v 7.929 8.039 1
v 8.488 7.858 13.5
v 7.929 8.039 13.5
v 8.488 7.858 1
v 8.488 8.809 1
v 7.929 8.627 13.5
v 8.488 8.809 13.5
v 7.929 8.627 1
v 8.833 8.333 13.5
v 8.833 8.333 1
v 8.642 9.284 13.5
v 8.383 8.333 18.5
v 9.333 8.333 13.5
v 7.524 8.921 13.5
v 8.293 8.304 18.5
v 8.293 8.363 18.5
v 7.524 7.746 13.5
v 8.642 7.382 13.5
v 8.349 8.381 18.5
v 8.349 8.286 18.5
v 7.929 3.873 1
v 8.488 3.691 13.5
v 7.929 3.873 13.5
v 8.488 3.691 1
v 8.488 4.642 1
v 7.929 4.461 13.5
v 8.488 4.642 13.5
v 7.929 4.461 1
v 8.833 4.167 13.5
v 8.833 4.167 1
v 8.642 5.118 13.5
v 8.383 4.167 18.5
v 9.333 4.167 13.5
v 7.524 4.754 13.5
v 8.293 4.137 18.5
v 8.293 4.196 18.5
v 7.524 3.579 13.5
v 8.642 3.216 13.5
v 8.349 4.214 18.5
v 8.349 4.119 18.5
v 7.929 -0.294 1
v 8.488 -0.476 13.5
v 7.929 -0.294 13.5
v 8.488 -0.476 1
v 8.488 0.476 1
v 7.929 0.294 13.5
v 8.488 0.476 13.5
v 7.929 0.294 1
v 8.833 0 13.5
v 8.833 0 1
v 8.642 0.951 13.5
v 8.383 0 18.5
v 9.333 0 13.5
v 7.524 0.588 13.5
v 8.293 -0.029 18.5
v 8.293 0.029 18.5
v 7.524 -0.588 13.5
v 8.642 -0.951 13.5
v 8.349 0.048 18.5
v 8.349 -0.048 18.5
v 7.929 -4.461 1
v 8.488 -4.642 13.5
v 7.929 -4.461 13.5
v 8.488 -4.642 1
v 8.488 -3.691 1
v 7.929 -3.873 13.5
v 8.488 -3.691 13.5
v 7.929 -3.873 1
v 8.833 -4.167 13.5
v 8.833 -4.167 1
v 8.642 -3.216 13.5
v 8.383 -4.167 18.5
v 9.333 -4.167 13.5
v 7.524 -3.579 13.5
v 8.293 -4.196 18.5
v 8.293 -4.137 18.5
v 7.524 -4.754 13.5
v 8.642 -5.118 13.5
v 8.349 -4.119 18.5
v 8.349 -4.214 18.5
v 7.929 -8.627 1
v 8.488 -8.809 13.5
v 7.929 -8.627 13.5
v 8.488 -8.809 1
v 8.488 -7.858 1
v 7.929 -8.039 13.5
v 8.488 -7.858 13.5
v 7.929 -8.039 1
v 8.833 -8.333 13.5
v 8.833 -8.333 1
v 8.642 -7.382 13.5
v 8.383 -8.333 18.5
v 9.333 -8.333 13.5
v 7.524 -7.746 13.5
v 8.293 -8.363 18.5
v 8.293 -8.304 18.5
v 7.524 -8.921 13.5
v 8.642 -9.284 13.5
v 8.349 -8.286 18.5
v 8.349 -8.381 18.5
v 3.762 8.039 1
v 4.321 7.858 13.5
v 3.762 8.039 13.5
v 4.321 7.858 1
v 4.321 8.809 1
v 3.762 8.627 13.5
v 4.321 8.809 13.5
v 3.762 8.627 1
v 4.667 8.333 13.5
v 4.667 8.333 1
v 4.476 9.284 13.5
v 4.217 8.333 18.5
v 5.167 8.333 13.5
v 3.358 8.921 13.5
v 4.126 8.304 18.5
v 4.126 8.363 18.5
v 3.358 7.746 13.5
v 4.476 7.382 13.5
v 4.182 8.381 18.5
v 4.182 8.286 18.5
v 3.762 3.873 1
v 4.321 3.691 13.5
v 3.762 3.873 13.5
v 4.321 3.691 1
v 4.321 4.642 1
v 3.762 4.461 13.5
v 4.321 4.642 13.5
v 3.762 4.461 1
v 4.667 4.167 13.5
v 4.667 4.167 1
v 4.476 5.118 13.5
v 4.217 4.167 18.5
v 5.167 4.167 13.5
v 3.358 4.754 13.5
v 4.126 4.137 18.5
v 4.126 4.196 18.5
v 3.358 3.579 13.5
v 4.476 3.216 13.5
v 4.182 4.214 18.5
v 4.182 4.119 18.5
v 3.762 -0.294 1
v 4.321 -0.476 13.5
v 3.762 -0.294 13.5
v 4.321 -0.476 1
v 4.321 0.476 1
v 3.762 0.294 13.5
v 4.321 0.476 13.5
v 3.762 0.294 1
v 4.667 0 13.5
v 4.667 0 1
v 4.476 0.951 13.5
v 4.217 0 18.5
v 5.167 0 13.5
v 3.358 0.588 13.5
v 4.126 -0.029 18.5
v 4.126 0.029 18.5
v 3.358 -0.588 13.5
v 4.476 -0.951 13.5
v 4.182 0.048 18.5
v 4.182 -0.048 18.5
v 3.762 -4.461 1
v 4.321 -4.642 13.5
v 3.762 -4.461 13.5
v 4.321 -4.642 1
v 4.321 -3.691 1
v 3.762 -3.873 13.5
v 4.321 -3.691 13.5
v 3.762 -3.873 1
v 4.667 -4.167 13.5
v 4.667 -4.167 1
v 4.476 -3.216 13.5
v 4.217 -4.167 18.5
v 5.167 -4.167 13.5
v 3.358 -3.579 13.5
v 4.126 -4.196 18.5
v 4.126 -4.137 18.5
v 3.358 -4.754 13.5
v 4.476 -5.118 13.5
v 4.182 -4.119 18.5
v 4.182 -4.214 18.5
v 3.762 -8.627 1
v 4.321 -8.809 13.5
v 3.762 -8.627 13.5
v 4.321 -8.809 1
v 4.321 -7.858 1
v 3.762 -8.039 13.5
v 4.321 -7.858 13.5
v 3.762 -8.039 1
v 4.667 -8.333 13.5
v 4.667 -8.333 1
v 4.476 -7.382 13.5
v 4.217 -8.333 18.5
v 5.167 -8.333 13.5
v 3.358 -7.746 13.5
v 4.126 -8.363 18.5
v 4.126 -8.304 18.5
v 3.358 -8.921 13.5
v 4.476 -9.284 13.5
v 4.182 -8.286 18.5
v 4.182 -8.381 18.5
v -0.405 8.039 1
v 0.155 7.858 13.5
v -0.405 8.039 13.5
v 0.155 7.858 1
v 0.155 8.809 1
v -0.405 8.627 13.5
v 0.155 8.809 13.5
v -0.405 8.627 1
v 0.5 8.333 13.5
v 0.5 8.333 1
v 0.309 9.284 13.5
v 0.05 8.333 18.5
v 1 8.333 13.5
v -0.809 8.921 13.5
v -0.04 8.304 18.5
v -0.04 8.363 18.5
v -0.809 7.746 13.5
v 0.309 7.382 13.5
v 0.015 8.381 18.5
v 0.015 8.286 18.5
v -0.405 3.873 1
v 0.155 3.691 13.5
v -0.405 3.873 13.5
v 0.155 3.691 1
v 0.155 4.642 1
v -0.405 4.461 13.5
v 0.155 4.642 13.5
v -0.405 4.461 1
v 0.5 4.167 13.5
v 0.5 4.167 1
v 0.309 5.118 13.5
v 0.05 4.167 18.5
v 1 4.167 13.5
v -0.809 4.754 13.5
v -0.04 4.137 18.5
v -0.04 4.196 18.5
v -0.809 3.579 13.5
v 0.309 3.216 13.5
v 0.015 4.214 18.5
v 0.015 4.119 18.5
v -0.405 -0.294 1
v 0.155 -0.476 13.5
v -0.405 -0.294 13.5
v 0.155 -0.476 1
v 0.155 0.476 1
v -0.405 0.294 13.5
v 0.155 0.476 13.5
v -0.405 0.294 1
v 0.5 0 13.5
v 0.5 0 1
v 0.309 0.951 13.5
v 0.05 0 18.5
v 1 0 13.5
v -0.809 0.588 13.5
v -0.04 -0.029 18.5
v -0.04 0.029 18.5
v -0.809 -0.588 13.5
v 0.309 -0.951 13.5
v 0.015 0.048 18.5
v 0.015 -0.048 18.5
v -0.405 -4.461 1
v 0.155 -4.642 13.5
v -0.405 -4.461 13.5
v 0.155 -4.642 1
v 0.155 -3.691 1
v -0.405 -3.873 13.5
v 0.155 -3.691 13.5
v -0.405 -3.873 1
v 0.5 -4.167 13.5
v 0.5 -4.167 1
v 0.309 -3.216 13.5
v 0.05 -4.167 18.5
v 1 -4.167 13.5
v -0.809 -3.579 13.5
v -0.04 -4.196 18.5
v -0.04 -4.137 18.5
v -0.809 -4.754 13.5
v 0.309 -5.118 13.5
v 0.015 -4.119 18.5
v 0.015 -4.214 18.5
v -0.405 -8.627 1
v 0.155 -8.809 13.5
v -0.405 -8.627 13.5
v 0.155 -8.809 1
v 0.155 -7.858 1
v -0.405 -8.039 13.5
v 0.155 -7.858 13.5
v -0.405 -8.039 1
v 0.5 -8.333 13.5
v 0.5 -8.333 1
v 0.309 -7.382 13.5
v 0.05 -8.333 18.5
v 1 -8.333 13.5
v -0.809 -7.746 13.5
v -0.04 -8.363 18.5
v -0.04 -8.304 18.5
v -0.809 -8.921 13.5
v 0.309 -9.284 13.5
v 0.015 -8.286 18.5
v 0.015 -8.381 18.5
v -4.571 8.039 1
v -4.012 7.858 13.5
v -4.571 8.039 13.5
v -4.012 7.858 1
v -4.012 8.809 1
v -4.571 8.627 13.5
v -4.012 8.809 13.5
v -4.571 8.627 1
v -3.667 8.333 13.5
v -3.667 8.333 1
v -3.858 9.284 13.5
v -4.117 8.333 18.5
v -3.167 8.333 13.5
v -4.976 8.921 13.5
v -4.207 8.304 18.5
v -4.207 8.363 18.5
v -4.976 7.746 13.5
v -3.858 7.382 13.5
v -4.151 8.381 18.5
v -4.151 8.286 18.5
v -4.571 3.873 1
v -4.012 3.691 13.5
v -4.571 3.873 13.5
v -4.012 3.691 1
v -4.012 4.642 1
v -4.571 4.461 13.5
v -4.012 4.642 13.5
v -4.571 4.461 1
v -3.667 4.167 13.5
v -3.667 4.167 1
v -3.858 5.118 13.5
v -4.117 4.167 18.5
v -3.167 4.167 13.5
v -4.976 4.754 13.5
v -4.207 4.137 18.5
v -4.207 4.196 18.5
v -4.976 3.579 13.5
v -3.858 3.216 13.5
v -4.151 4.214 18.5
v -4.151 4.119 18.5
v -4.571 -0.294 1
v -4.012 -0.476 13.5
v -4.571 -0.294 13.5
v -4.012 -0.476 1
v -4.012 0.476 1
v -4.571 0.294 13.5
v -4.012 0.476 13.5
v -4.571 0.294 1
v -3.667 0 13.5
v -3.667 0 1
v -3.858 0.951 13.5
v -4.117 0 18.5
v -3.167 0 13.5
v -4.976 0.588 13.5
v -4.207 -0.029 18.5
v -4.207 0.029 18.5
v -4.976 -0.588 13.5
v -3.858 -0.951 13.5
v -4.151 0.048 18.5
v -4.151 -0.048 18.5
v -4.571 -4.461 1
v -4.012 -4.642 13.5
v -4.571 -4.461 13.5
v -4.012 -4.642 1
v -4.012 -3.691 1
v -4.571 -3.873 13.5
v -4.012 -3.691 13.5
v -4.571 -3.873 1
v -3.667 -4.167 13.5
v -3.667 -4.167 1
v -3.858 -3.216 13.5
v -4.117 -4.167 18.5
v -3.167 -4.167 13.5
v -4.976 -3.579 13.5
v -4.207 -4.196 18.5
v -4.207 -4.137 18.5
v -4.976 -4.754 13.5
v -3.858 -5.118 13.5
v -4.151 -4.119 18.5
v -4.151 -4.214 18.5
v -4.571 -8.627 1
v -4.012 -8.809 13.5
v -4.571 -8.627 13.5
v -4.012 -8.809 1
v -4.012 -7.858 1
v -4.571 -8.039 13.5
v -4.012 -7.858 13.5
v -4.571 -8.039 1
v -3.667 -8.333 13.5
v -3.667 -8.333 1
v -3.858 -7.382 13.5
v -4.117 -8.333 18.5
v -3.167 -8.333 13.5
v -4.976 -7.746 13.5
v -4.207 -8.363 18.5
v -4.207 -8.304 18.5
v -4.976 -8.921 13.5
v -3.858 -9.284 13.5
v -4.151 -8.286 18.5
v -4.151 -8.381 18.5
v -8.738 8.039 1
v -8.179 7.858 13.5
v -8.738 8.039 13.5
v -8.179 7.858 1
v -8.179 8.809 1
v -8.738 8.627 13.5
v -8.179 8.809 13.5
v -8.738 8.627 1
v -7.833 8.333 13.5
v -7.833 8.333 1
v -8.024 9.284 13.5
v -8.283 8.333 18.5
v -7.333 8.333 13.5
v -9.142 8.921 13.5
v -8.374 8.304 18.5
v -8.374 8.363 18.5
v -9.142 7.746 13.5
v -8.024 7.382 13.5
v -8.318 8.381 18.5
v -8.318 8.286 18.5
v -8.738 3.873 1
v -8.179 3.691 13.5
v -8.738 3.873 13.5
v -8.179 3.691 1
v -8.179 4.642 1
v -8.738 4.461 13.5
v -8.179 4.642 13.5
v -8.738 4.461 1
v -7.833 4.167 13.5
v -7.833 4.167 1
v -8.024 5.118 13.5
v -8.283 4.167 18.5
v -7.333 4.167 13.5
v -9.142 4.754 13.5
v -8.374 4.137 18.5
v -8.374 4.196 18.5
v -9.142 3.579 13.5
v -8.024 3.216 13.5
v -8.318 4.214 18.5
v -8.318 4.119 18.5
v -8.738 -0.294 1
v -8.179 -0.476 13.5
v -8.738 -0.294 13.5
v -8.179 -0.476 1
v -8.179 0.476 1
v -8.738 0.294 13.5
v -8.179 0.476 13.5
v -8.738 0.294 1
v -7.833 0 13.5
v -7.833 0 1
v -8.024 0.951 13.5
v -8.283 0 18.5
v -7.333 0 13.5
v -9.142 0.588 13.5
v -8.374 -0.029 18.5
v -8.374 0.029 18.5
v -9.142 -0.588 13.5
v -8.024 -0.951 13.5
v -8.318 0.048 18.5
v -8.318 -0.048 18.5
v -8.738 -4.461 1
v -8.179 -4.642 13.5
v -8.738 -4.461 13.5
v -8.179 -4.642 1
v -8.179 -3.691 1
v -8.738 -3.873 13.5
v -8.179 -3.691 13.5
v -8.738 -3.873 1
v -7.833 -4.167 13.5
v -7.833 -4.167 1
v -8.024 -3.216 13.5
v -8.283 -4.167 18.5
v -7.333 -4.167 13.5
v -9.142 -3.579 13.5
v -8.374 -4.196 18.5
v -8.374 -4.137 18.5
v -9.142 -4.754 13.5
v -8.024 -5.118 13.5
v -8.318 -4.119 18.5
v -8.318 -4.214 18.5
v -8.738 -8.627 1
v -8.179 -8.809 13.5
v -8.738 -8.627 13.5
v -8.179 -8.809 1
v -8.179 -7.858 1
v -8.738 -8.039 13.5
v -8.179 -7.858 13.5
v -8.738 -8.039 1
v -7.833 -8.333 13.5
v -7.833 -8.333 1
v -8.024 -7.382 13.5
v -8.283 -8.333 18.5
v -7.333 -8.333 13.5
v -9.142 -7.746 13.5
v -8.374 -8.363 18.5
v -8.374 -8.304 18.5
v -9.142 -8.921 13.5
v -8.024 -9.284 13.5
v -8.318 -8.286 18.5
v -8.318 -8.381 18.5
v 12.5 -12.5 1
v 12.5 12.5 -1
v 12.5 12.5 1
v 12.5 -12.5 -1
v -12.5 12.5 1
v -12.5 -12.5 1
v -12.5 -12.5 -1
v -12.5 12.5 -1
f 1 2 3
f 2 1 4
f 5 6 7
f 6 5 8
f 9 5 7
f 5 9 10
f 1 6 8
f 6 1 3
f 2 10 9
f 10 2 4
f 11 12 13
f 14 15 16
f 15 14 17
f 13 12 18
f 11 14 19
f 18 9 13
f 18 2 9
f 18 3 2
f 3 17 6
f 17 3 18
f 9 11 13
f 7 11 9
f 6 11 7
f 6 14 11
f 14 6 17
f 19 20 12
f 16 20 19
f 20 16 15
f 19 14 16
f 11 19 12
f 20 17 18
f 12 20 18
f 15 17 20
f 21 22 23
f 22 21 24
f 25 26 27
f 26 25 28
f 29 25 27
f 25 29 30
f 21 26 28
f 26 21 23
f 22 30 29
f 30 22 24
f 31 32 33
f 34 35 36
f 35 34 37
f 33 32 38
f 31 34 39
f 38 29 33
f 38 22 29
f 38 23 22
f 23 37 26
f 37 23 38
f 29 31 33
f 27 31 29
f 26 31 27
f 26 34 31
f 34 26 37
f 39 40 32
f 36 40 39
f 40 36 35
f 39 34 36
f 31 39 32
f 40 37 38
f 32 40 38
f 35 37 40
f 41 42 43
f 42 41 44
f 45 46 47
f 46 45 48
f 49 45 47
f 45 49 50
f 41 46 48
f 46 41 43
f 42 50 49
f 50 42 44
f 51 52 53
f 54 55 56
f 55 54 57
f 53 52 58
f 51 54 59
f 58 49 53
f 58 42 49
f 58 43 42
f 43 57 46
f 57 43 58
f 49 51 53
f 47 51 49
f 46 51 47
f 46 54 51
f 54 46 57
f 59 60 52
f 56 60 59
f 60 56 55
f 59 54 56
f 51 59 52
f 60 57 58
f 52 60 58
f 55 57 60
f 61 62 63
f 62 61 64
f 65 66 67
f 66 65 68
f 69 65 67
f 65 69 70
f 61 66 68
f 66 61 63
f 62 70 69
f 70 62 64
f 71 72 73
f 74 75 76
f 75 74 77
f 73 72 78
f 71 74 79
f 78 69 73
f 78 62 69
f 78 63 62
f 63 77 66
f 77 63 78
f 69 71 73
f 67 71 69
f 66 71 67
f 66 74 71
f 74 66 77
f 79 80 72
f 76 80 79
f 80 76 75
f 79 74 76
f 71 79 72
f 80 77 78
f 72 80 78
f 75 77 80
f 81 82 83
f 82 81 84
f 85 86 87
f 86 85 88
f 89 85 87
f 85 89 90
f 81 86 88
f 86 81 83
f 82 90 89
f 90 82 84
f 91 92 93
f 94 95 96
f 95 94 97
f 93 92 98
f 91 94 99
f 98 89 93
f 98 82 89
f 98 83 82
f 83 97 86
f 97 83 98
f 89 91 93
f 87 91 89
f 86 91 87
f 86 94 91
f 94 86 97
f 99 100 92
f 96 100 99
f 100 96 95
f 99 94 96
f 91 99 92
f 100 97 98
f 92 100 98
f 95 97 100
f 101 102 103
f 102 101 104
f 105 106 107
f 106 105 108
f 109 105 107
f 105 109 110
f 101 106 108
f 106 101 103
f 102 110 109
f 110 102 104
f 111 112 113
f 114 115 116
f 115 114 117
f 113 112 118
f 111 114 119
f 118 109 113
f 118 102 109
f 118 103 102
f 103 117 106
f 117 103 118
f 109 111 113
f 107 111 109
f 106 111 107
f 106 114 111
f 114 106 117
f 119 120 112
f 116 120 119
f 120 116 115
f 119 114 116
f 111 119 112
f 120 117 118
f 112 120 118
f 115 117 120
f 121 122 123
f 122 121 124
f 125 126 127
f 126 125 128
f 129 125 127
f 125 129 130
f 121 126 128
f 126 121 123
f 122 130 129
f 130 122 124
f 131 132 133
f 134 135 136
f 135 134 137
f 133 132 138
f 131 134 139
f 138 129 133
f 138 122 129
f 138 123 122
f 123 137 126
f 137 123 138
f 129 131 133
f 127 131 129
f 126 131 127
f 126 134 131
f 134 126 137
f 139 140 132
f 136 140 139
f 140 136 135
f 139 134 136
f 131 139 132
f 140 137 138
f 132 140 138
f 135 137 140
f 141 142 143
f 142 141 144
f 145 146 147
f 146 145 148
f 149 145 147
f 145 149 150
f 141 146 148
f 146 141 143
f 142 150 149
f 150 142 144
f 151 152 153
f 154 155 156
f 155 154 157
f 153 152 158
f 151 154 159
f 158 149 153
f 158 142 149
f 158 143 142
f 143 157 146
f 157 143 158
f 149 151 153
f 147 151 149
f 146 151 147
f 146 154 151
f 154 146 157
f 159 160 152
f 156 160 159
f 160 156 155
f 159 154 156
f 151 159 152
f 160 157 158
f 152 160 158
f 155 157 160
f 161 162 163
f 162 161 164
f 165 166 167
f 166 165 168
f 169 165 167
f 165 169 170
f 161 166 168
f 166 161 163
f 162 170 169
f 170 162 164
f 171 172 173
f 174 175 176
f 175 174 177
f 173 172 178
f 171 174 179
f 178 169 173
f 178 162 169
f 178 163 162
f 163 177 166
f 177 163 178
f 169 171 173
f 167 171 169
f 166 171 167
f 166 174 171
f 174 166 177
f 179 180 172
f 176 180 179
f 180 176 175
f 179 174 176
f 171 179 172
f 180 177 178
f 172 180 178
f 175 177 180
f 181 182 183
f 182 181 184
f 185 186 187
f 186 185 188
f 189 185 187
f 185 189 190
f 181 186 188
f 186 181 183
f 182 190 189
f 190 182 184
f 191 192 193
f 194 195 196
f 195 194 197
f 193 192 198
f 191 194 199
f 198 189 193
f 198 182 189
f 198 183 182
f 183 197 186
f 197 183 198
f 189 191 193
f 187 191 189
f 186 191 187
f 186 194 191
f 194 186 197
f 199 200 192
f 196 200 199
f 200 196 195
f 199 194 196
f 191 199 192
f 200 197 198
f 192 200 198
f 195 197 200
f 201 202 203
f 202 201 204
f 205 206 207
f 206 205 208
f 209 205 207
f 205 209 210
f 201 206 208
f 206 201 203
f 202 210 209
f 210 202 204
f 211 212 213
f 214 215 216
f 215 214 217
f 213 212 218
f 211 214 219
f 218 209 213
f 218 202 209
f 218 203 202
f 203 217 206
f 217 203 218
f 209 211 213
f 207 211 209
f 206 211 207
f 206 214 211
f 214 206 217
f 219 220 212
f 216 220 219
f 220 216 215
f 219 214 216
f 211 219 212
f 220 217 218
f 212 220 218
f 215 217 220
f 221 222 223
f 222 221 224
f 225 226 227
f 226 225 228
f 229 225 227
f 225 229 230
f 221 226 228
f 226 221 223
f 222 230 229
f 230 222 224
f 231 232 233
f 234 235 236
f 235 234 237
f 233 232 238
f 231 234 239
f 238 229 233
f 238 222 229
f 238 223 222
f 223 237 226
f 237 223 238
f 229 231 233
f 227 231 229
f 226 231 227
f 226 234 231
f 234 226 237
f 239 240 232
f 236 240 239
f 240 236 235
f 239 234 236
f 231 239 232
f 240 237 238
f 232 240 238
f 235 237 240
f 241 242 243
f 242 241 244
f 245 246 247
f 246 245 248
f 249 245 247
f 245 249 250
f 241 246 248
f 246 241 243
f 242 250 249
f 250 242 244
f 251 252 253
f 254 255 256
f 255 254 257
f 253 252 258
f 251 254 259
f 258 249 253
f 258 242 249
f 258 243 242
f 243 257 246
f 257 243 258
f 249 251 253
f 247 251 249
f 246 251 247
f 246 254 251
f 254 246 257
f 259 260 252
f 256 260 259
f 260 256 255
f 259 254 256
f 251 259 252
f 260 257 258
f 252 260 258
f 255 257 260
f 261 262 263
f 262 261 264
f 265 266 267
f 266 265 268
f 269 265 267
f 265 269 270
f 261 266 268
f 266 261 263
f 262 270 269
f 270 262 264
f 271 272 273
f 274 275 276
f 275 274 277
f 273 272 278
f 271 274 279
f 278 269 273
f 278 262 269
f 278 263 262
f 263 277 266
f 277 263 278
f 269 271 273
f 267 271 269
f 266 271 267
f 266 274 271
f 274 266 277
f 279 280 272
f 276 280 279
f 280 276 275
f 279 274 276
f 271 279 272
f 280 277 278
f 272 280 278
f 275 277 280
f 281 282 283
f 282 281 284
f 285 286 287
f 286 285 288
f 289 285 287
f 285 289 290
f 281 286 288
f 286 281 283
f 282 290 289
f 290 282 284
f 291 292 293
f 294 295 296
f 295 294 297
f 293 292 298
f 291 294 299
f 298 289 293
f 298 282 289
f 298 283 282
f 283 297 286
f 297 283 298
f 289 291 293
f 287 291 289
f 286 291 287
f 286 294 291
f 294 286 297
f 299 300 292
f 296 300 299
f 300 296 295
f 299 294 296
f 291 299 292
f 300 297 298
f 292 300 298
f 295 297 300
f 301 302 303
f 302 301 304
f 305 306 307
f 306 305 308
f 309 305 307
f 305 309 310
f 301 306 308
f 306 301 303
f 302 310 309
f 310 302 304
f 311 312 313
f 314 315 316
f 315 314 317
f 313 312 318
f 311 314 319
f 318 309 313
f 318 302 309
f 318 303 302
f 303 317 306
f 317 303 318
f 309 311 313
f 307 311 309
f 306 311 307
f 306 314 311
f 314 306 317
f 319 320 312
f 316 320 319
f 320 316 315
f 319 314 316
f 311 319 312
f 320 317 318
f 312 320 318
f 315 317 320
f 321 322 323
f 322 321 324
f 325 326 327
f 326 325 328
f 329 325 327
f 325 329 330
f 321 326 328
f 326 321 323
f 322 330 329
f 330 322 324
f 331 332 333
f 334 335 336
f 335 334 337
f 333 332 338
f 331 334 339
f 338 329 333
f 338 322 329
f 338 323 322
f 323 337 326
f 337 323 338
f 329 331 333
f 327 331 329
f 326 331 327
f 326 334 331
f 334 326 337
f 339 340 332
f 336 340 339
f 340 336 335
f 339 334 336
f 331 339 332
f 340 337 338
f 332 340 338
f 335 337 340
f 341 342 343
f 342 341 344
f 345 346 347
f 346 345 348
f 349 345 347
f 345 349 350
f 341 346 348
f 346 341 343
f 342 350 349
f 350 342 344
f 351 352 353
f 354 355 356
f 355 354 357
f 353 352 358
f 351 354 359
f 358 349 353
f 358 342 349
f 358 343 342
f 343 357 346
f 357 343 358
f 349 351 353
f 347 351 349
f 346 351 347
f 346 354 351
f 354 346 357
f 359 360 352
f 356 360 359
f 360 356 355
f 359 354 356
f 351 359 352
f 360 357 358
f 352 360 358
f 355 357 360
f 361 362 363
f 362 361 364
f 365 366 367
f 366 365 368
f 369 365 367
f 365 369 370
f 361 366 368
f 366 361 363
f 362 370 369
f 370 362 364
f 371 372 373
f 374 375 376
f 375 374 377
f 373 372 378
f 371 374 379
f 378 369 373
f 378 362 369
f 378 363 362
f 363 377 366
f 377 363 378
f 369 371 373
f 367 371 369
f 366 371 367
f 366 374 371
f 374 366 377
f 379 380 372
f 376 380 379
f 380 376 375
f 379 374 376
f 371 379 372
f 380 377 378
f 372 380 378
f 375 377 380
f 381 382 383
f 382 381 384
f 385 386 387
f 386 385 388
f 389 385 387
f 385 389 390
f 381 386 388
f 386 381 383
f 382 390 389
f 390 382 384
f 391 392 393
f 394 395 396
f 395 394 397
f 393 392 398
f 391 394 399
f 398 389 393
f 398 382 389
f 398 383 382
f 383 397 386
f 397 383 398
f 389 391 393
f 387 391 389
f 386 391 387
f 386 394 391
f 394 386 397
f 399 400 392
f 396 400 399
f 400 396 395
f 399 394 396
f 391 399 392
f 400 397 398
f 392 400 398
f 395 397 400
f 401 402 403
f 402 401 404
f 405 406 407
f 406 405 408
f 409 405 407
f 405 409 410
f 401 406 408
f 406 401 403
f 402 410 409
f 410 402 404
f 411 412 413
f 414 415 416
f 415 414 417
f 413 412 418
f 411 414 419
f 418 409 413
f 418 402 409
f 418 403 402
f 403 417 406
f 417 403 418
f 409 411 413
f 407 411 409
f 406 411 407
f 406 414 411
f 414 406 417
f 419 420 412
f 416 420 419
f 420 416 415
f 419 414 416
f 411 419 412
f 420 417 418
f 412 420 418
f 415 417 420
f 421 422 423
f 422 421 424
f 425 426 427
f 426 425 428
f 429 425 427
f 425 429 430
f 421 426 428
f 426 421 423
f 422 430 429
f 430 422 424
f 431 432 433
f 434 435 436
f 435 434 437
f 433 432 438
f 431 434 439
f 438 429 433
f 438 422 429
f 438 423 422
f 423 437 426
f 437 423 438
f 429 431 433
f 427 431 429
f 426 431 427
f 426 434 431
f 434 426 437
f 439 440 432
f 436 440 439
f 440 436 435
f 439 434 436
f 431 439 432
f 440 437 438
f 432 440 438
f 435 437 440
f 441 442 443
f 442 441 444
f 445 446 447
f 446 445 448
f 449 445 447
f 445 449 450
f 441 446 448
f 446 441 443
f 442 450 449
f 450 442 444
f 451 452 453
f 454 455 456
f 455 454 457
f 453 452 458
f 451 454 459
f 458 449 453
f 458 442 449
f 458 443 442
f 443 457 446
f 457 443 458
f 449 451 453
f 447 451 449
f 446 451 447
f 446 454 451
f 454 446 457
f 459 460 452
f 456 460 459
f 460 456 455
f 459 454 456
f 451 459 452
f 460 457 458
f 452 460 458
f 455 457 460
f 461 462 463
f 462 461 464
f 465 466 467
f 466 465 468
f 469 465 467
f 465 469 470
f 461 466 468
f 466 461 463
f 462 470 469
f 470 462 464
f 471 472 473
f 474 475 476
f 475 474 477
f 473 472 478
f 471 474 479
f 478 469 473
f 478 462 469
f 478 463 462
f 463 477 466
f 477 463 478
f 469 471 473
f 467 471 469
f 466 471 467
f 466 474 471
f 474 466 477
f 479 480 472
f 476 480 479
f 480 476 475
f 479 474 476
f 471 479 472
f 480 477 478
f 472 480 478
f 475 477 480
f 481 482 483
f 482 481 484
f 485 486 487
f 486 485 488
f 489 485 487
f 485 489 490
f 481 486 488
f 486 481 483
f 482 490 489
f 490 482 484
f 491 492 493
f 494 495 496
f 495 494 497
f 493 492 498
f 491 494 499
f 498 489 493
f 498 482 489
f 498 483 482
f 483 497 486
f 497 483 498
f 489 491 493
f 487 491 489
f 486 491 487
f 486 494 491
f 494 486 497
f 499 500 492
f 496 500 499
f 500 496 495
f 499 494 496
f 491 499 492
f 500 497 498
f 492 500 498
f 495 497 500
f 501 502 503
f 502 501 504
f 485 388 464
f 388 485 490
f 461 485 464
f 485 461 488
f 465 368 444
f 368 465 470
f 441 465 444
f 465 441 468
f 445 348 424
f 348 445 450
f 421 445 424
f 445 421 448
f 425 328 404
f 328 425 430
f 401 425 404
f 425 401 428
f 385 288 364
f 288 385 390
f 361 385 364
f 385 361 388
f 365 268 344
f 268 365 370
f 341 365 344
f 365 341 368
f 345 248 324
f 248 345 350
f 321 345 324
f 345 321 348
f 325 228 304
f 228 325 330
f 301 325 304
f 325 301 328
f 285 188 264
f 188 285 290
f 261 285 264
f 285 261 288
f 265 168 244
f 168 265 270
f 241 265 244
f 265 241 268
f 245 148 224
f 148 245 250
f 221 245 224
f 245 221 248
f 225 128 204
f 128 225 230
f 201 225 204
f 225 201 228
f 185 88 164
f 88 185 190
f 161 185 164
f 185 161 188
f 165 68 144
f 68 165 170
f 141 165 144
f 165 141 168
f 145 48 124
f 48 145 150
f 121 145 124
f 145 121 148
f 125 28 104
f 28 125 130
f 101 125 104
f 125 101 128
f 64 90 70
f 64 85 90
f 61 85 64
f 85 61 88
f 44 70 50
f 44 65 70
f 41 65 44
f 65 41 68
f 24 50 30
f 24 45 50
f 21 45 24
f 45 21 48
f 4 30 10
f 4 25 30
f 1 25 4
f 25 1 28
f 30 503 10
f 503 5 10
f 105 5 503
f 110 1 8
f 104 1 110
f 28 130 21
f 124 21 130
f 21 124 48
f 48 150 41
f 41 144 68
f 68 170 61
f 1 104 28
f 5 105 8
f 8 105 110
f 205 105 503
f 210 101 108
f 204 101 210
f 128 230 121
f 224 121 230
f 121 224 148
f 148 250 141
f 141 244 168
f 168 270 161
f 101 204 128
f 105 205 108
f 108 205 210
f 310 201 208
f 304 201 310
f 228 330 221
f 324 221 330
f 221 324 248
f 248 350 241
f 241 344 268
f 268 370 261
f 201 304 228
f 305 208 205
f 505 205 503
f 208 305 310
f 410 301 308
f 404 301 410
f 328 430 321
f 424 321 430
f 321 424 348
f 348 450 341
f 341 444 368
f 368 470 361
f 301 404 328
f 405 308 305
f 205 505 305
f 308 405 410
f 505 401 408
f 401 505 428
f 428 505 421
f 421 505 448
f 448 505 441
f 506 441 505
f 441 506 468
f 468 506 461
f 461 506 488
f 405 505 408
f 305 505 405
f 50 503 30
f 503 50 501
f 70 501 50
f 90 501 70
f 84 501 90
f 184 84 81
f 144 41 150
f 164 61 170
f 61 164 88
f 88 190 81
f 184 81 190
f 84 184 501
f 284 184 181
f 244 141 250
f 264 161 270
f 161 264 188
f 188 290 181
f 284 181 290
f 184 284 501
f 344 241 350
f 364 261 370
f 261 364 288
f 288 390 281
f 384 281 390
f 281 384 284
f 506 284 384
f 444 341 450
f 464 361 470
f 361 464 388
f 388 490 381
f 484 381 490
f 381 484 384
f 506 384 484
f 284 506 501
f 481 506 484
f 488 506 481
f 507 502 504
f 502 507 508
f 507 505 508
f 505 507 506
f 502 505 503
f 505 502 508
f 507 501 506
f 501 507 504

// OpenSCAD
nbPiquesLigne=5;
HauteurPique=15;
tailleCase=25;
marge=0;

emplacement=tailleCase-(2*marge);
cube([tailleCase,tailleCase,2],center=true);
for(x=[1:nbPiquesLigne])
{
    for (y=[1:nbPiquesLigne])
    {
        translate([emplacement/2-emplacement/(nbPiquesLigne+1)*x,emplacement/2-emplacement/(nbPiquesLigne+1)*y,HauteurPique/2])
        {
            cylinder(d=1,center=true,h=HauteurPique);
            translate([0,0,HauteurPique/2+1])
            {
                cylinder(d1=2,d2=0.1,center=true,h=5);
            }
        }
    }
}
